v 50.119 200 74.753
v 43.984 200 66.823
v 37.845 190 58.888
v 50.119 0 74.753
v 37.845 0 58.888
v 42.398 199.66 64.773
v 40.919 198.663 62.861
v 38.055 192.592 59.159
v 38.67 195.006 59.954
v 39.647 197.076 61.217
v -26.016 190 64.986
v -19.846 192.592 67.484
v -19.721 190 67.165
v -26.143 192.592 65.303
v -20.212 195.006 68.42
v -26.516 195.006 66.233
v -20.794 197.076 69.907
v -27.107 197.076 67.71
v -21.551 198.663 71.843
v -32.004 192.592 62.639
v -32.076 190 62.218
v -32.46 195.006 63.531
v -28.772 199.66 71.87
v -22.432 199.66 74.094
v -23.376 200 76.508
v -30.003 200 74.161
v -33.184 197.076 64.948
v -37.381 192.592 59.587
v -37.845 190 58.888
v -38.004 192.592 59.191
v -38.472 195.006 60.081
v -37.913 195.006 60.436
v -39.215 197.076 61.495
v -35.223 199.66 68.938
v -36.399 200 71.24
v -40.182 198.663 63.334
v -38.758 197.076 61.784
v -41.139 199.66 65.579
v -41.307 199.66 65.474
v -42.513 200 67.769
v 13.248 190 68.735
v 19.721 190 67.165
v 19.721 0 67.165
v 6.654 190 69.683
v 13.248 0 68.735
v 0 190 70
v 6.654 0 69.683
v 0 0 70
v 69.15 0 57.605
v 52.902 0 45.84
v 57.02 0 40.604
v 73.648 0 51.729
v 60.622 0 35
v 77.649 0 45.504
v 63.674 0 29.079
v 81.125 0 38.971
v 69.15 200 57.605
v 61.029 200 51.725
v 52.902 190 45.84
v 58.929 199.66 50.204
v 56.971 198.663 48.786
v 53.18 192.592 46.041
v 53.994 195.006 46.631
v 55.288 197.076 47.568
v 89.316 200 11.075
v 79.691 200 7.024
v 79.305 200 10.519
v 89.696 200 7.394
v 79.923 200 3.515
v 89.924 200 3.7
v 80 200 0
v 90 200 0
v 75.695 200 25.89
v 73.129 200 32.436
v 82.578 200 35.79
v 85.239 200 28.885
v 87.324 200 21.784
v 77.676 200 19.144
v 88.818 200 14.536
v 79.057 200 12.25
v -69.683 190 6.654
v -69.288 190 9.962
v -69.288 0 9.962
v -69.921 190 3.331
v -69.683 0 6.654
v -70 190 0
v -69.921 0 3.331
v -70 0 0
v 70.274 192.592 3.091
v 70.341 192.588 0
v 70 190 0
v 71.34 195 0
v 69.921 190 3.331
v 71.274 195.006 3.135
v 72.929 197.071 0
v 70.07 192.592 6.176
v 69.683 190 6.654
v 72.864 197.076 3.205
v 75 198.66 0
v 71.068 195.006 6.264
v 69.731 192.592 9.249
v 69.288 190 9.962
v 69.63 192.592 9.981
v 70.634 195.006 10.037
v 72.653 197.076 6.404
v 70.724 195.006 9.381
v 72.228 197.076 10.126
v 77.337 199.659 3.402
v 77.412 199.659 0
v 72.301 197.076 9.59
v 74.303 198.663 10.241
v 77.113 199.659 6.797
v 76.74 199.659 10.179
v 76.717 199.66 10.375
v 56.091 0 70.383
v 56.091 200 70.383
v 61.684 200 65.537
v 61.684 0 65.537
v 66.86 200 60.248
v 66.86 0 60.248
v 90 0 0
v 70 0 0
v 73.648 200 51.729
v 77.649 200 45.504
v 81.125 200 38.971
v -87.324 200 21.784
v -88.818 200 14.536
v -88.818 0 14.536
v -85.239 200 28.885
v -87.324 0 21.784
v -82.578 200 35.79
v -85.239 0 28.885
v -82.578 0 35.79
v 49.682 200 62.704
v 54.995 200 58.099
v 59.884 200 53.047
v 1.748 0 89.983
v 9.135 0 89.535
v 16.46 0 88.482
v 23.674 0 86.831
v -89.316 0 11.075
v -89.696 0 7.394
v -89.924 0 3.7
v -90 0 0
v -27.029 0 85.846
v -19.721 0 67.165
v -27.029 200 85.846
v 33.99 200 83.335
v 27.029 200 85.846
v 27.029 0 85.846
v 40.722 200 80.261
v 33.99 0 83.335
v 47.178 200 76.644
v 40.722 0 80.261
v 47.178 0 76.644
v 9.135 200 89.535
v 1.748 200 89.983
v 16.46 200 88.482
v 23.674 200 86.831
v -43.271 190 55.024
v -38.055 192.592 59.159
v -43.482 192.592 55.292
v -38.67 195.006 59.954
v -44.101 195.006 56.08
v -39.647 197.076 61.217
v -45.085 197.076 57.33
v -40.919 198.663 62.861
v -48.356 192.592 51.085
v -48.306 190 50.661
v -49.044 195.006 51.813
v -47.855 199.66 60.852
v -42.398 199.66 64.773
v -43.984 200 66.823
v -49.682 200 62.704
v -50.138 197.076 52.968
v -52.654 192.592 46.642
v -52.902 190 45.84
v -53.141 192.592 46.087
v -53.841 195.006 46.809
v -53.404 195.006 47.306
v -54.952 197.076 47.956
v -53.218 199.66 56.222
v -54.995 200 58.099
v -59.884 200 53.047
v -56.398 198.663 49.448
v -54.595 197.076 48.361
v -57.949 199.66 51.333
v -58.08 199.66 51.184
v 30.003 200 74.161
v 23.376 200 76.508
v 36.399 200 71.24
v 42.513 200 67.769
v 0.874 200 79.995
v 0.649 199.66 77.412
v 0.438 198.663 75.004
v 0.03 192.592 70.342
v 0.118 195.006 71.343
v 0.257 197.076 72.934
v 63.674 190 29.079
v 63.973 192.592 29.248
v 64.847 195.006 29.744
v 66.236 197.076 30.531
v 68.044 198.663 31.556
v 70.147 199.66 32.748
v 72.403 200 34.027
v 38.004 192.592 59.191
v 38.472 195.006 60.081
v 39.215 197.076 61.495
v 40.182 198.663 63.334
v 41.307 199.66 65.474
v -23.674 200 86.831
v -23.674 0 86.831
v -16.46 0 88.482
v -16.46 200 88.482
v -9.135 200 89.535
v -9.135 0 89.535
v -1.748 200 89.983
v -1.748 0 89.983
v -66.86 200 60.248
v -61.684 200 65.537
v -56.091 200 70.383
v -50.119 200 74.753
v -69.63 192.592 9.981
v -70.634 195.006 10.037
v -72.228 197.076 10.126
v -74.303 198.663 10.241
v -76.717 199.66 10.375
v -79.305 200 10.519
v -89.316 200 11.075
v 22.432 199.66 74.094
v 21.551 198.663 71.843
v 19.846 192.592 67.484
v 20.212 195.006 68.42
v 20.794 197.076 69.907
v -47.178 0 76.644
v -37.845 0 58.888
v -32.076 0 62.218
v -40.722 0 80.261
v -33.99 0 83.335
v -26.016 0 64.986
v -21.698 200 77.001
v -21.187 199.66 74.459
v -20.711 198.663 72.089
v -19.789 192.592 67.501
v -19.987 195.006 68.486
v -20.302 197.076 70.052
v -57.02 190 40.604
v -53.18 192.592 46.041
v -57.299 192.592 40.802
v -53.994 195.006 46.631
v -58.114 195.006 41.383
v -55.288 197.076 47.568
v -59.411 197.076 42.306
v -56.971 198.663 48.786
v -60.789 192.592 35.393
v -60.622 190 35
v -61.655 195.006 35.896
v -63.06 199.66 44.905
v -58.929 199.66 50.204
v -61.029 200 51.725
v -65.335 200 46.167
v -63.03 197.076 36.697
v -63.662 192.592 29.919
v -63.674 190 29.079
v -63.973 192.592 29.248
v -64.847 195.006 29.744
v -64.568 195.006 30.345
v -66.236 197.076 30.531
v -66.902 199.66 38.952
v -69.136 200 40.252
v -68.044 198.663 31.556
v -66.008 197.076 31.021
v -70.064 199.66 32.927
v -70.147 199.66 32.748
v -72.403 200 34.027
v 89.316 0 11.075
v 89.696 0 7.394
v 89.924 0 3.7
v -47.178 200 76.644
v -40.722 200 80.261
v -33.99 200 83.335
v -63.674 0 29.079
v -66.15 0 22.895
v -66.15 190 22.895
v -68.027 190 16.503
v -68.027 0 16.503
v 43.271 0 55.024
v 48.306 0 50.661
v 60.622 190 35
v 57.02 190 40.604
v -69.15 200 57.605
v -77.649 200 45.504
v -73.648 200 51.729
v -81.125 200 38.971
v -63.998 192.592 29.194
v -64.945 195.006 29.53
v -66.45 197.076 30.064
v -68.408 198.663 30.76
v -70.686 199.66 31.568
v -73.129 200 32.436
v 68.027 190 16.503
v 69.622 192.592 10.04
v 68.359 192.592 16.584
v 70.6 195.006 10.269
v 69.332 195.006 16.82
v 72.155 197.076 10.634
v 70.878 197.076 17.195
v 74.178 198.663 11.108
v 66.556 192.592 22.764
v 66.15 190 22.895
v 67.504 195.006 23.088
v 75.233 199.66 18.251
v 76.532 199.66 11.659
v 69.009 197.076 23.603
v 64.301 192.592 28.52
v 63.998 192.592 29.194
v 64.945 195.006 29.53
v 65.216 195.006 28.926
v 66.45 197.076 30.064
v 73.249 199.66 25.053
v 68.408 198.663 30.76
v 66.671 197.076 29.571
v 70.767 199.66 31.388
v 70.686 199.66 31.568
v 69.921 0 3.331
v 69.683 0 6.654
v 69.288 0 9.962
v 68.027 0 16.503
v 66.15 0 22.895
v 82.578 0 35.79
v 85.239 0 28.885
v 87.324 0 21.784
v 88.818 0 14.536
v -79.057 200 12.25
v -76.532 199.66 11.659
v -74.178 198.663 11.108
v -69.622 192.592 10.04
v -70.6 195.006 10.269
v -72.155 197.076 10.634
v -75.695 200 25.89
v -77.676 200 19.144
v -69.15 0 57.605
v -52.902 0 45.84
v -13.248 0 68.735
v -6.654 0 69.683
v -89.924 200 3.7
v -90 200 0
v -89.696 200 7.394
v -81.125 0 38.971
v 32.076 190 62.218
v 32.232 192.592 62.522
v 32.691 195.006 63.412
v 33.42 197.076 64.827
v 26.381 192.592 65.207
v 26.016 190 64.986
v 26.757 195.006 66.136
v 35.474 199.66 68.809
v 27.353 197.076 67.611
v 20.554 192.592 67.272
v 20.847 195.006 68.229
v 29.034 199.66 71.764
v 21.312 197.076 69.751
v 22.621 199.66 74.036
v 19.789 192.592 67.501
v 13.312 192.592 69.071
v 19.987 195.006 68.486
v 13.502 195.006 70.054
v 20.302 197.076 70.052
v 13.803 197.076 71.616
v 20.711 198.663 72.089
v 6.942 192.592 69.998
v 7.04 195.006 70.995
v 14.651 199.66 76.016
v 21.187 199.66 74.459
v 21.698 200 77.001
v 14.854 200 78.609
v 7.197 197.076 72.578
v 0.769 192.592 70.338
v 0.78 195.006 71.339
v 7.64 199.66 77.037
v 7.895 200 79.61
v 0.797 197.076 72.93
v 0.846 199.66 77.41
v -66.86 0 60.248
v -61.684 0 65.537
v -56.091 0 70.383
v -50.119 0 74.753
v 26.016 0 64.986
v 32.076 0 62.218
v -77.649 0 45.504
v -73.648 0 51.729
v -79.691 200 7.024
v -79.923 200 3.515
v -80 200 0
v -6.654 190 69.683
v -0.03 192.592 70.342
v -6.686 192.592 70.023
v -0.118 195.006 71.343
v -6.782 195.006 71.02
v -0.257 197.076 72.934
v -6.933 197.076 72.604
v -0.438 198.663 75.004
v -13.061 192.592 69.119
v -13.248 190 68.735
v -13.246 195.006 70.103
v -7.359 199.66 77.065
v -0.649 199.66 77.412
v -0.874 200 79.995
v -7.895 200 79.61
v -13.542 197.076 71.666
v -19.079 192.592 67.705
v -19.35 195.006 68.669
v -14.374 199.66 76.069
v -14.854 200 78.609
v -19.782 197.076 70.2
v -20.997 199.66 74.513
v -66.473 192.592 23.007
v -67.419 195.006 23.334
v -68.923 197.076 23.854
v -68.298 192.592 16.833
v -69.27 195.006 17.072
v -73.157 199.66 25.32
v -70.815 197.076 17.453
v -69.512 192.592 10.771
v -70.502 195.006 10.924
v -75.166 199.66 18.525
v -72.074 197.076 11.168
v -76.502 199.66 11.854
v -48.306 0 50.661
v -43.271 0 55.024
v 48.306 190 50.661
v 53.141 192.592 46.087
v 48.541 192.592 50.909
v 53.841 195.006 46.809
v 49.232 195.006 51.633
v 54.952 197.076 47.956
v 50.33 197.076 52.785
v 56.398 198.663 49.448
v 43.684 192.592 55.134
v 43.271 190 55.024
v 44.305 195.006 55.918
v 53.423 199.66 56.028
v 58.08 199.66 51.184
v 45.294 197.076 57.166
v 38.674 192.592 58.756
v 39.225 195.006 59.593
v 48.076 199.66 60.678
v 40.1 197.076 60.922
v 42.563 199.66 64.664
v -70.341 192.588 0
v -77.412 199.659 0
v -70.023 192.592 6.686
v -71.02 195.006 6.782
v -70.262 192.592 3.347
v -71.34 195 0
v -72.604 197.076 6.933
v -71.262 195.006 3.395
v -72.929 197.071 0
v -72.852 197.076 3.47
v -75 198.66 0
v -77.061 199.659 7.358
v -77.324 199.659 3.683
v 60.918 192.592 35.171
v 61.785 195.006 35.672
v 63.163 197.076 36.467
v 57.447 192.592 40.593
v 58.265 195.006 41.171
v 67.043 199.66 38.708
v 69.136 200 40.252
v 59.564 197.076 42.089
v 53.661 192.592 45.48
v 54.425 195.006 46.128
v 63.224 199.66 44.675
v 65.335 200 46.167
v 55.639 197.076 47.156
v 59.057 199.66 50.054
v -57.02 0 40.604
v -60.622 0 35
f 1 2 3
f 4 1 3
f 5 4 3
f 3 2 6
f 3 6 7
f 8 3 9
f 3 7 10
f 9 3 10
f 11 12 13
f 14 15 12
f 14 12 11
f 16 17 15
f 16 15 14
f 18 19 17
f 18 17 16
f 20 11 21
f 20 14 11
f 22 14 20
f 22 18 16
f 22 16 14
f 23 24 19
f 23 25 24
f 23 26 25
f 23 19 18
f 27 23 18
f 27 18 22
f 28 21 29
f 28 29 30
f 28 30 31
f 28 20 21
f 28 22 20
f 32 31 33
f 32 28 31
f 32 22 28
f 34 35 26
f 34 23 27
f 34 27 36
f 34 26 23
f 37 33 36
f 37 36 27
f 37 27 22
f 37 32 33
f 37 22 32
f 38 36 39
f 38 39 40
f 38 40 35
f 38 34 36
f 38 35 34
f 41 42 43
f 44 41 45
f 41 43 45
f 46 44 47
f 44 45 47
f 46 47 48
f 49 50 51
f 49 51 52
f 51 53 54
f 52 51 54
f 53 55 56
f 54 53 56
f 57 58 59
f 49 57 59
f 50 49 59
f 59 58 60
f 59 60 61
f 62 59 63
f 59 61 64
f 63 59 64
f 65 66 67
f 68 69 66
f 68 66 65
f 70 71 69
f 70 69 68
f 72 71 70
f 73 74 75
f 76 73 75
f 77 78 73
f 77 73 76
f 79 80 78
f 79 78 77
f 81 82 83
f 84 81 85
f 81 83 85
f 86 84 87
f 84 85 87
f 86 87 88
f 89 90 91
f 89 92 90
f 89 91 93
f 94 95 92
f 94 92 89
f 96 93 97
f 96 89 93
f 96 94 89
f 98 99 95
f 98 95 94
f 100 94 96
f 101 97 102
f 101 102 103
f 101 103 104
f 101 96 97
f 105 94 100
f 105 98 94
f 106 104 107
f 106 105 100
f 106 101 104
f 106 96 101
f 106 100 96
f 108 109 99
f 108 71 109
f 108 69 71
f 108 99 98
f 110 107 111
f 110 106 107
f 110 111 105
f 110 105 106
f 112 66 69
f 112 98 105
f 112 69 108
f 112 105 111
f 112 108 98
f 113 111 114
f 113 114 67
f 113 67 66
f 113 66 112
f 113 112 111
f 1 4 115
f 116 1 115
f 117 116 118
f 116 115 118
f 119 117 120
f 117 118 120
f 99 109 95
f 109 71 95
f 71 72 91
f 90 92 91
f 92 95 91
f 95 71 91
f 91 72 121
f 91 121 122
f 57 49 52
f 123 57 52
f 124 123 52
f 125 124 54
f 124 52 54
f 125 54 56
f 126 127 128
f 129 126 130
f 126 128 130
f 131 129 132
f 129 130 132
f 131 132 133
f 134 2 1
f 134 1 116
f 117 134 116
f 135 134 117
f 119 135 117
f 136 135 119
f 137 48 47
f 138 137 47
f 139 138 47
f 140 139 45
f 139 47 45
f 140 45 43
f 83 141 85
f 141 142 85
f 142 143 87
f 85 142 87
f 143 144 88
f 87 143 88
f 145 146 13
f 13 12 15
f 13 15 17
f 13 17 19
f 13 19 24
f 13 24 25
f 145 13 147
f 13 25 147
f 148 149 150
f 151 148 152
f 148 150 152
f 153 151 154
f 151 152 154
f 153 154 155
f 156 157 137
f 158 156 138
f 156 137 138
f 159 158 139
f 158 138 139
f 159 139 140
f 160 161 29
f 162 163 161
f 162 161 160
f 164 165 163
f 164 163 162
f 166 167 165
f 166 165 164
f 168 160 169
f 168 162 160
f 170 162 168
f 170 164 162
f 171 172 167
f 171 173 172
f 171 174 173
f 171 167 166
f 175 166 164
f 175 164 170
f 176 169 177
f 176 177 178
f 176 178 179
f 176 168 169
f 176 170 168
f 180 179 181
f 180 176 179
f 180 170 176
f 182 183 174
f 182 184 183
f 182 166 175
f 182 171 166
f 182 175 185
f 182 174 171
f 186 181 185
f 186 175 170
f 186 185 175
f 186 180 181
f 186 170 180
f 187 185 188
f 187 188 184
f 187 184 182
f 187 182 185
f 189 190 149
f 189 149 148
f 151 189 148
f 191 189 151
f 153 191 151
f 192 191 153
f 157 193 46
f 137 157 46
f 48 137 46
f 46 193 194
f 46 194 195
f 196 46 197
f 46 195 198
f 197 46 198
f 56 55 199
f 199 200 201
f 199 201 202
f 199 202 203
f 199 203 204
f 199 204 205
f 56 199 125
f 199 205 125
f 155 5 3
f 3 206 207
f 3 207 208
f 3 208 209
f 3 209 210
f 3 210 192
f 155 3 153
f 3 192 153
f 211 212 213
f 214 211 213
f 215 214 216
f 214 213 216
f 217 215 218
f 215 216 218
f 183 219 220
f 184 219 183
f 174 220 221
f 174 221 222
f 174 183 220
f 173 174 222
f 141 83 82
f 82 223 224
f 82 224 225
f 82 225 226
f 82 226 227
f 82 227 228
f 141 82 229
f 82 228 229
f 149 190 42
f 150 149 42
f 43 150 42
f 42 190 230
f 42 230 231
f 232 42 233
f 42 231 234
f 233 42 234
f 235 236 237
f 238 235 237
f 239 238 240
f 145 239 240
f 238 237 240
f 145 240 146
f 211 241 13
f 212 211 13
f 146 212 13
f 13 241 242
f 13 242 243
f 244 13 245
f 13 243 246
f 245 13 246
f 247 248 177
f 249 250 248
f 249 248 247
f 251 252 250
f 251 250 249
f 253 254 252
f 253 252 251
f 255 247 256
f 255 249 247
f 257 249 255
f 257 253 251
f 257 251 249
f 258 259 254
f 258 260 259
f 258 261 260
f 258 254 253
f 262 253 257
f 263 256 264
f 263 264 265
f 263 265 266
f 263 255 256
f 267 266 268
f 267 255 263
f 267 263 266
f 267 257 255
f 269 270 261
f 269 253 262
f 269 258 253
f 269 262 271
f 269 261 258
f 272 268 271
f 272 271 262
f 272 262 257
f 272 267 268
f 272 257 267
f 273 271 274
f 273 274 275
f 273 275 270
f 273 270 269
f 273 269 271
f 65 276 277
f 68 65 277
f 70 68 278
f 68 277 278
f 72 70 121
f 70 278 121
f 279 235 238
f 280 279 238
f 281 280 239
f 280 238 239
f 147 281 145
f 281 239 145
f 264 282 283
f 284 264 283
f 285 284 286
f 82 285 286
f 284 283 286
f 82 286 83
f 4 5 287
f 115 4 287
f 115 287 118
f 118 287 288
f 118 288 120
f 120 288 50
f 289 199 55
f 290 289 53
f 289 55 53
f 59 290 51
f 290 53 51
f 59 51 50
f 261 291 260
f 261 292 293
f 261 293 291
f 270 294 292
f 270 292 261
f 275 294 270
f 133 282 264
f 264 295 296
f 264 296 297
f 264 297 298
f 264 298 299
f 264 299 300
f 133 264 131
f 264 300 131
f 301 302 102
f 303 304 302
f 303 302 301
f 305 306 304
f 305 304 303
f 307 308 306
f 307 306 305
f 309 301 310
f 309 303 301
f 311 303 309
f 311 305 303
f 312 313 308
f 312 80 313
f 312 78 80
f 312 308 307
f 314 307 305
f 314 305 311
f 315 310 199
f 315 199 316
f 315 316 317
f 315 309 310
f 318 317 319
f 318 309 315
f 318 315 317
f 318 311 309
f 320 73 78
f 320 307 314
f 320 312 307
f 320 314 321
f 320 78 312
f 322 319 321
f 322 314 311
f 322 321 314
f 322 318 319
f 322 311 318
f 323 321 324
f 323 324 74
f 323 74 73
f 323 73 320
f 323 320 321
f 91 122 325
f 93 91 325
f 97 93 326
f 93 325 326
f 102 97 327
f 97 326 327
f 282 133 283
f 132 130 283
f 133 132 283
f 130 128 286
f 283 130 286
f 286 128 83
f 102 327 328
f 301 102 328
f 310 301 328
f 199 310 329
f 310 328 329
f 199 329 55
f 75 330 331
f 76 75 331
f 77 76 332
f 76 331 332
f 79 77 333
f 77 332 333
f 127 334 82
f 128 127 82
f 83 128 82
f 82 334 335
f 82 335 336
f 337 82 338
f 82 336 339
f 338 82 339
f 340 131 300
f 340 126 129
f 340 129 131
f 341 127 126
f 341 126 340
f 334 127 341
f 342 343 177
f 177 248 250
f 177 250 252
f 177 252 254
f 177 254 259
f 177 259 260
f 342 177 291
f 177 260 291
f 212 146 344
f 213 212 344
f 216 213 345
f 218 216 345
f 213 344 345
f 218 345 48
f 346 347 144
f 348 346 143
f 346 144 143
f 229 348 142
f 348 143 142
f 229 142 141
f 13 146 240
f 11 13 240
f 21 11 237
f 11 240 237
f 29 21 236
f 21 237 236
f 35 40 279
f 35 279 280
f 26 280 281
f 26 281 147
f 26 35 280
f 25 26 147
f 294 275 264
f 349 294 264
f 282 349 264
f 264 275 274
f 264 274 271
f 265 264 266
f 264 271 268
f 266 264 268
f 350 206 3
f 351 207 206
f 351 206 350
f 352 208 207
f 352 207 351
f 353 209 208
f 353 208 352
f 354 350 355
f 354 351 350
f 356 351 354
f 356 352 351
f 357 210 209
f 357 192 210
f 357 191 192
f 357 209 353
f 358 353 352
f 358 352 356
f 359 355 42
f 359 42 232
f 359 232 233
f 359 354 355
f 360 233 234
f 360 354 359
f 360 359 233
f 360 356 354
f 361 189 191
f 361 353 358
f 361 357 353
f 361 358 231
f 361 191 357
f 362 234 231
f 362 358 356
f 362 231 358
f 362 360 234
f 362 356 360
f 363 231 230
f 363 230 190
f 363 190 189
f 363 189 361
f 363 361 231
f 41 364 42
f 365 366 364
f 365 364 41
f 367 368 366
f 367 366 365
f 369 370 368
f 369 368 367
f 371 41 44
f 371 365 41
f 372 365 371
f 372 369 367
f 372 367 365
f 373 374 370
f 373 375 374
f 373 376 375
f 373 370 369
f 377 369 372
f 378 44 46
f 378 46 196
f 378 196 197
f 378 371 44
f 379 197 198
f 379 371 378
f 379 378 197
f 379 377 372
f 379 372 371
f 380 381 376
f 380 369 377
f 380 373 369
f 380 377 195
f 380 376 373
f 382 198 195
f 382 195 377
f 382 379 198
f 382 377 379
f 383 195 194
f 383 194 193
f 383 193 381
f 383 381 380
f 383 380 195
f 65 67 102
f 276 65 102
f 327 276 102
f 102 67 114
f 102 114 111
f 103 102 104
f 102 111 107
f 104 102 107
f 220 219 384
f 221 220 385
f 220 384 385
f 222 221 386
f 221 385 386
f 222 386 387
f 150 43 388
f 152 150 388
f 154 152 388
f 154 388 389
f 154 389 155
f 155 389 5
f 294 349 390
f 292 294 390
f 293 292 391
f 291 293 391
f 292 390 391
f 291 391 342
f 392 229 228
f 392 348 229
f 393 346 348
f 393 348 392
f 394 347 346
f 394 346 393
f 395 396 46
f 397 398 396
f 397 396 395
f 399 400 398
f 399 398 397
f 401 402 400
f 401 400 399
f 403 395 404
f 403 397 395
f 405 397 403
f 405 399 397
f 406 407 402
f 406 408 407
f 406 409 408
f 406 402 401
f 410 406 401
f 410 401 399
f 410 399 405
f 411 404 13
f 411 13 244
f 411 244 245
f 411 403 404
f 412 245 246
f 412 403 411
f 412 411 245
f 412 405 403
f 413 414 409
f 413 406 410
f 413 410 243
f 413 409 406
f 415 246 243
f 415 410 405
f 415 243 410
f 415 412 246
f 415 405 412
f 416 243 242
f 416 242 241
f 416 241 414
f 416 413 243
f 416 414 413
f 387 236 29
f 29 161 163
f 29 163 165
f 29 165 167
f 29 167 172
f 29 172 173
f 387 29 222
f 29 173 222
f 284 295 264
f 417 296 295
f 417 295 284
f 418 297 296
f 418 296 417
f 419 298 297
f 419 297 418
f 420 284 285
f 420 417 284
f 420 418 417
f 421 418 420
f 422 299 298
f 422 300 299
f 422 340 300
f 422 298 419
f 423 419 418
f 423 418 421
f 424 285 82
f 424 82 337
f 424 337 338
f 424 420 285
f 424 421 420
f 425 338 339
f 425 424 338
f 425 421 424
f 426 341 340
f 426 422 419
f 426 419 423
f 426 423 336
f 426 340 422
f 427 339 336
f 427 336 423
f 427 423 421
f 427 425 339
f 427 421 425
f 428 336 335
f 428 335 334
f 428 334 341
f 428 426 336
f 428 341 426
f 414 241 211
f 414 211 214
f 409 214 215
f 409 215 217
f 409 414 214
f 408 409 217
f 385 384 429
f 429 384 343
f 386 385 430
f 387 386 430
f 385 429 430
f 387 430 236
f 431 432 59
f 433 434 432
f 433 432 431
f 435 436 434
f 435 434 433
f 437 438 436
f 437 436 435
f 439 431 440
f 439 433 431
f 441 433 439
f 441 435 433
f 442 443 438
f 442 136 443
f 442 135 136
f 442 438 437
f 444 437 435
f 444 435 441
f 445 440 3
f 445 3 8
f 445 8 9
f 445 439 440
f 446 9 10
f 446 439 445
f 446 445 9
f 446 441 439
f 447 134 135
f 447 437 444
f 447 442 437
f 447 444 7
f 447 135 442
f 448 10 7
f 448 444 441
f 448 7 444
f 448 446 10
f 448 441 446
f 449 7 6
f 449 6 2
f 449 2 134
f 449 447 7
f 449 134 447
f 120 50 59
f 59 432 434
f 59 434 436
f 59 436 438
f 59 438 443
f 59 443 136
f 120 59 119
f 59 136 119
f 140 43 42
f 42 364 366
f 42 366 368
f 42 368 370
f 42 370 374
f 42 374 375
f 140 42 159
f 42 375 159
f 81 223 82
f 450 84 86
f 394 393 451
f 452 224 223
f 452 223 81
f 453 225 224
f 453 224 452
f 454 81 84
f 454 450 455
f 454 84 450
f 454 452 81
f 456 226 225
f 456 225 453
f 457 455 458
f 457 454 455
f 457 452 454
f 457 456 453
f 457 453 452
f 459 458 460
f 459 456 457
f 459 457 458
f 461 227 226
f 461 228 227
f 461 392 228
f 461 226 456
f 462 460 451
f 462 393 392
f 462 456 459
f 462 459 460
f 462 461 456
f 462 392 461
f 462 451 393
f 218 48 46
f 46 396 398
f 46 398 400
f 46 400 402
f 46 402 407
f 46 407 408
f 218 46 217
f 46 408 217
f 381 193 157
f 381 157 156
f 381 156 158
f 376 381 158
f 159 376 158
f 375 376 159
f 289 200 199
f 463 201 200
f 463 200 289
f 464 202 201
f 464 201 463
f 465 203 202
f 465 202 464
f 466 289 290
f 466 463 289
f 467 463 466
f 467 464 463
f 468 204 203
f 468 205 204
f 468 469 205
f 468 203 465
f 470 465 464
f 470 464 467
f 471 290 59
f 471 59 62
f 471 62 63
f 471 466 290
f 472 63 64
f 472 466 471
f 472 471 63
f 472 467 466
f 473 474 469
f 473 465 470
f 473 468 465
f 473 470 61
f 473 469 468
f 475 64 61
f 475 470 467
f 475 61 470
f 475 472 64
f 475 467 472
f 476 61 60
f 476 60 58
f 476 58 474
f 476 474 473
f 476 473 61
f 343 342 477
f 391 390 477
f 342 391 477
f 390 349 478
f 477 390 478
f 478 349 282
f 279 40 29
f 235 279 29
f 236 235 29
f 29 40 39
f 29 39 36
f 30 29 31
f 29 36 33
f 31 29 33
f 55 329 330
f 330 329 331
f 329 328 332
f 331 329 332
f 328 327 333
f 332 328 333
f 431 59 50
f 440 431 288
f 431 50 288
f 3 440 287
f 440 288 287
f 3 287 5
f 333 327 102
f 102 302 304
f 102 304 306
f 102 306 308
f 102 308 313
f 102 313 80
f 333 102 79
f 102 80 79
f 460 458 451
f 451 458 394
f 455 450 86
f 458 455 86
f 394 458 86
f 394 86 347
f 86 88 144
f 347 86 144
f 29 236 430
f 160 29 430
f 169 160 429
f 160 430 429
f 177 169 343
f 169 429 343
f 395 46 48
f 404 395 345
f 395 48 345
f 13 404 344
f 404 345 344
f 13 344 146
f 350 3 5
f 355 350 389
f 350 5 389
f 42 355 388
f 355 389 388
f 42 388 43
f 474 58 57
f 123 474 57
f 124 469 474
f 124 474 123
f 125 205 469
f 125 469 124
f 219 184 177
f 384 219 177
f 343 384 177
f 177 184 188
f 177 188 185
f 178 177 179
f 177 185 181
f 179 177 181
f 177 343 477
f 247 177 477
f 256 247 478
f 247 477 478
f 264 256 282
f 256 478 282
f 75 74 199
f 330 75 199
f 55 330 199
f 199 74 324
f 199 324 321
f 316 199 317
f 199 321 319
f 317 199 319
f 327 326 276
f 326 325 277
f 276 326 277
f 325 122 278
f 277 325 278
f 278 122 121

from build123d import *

# Parameters (mm, degrees)
BOSS_EXTRUDE1_DEPTH = 200
FILLET1_R           = 10
CUT_EXTRUDE1_START  = -200.000005
CUT_EXTRUDE1_DEPTH  = 200.000005


with BuildPart() as part:
    # Sketch1 → Boss-Extrude1 (new body)
    with BuildSketch(Plane(origin=(0, 0, 0), x_dir=(1, 0, 0), z_dir=(0, 1, 0))):
        with BuildLine():
            Line((90, 0), (70, 0))
            ThreePointArc((70, 0), (0, -70), (-70, 0))
            Line((-70, 0), (-90, 0))
            ThreePointArc((-90, 0), (0, -90), (90, 0))
        make_face()
    extrude(amount=BOSS_EXTRUDE1_DEPTH)

    # Fillet1
    fillet1_edges = [part.edges().sort_by_distance(p)[0] for p in [
        (0, 200, 70),
    ]]
    fillet(fillet1_edges, radius=FILLET1_R)

    # Sketch2 → Cut-Extrude1 (cut)
    with BuildSketch(Plane.XZ.offset(CUT_EXTRUDE1_START)):
        with BuildLine():
            Line((0, 70), (-1.74828752, 89.983017791))
            ThreePointArc((-1.74828752, 89.983017791), (0, 90), (1.74828752, 89.983017791))
            Line((1.74828752, 89.983017791), (0, 70))
        make_face()
        with BuildLine():
            Line((19.721278979, 67.164508153), (23.673676083, 86.830622828))
            ThreePointArc((23.673676083, 86.830622828), (25.355930116, 86.354367625), (27.028615266, 85.845523802))
            Line((27.028615266, 85.845523802), (19.721278979, 67.164508153))
        make_face()
        with BuildLine():
            Line((37.844857222, 58.887747298), (47.177739243, 76.643727205))
            ThreePointArc((47.177739243, 76.643727205), (48.657673571, 75.712817955), (50.119245348, 74.753336018))
            Line((50.119245348, 74.753336018), (37.844857222, 58.887747298))
        make_face()
        with BuildLine():
            Line((52.902470205, 45.840251376), (66.859742546, 60.247612622))
            ThreePointArc((66.859742546, 60.247612622), (68.017461692, 58.937466055), (69.149512243, 57.605077524))
            Line((69.149512243, 57.605077524), (52.902470205, 45.840251376))
        make_face()
        with BuildLine():
            Line((63.674239675, 29.07905091), (81.125167138, 38.970594771))
            ThreePointArc((81.125167138, 38.970594771), (81.866879582, 37.38735117), (82.577696904, 35.789998241))
            Line((82.577696904, 35.789998241), (63.674239675, 29.07905091))
        make_face()
        with BuildLine():
            Line((69.287500932, 9.962038679), (88.818313159, 14.536411098))
            ThreePointArc((88.818313159, 14.536411098), (89.083929769, 12.808335445), (89.31592767, 11.075426151))
            Line((89.31592767, 11.075426151), (69.287500932, 9.962038679))
        make_face()
        with BuildLine():
            Line((69.287500932, -9.962038679), (89.31592767, -11.075426151))
            ThreePointArc((89.31592767, -11.075426151), (89.083929769, -12.808335445), (88.818313159, -14.536411098))
            Line((88.818313159, -14.536411098), (69.287500932, -9.962038679))
        make_face()
        with BuildLine():
            Line((63.674239675, -29.07905091), (82.577696904, -35.789998241))
            ThreePointArc((82.577696904, -35.789998241), (81.866879582, -37.38735117), (81.125167138, -38.970594771))
            Line((81.125167138, -38.970594771), (63.674239675, -29.07905091))
        make_face()
        with BuildLine():
            Line((52.902470205, -45.840251376), (69.149512243, -57.605077524))
            ThreePointArc((69.149512243, -57.605077524), (68.017461692, -58.937466055), (66.859742546, -60.247612622))
            Line((66.859742546, -60.247612622), (52.902470205, -45.840251376))
        make_face()
        with BuildLine():
            Line((37.844857222, -58.887747298), (50.119245348, -74.753336018))
            ThreePointArc((50.119245348, -74.753336018), (48.657673571, -75.712817955), (47.177739243, -76.643727205))
            Line((47.177739243, -76.643727205), (37.844857222, -58.887747298))
        make_face()
        with BuildLine():
            Line((19.721278979, -67.164508153), (27.028615266, -85.845523802))
            ThreePointArc((27.028615266, -85.845523802), (25.355930116, -86.354367625), (23.673676083, -86.830622828))
            Line((23.673676083, -86.830622828), (19.721278979, -67.164508153))
        make_face()
        with BuildLine():
            Line((0, -70), (1.74828752, -89.983017791))
            ThreePointArc((1.74828752, -89.983017791), (0, -90), (-1.74828752, -89.983017791))
            Line((-1.74828752, -89.983017791), (0, -70))
        make_face()
        with BuildLine():
            Line((-19.721278979, -67.164508153), (-23.673676083, -86.830622828))
            ThreePointArc((-23.673676083, -86.830622828), (-25.355930116, -86.354367625), (-27.028615266, -85.845523802))
            Line((-27.028615266, -85.845523802), (-19.721278979, -67.164508153))
        make_face()
        with BuildLine():
            Line((-37.844857222, -58.887747298), (-47.177739243, -76.643727205))
            ThreePointArc((-47.177739243, -76.643727205), (-48.657673571, -75.712817955), (-50.119245348, -74.753336018))
            Line((-50.119245348, -74.753336018), (-37.844857222, -58.887747298))
        make_face()
        with BuildLine():
            Line((-52.902470205, -45.840251376), (-66.859742546, -60.247612622))
            ThreePointArc((-66.859742546, -60.247612622), (-68.017461692, -58.937466055), (-69.149512243, -57.605077524))
            Line((-69.149512243, -57.605077524), (-52.902470205, -45.840251376))
        make_face()
        with BuildLine():
            Line((-63.674239675, -29.07905091), (-81.125167138, -38.970594771))
            ThreePointArc((-81.125167138, -38.970594771), (-81.866879582, -37.38735117), (-82.577696904, -35.789998241))
            Line((-82.577696904, -35.789998241), (-63.674239675, -29.07905091))
        make_face()
        with BuildLine():
            Line((-69.287500932, -9.962038679), (-88.818313159, -14.536411098))
            ThreePointArc((-88.818313159, -14.536411098), (-89.083929769, -12.808335445), (-89.31592767, -11.075426151))
            Line((-89.31592767, -11.075426151), (-69.287500932, -9.962038679))
        make_face()
        with BuildLine():
            Line((-69.287500932, 9.962038679), (-89.31592767, 11.075426151))
            ThreePointArc((-89.31592767, 11.075426151), (-89.083929769, 12.808335445), (-88.818313159, 14.536411098))
            Line((-88.818313159, 14.536411098), (-69.287500932, 9.962038679))
        make_face()
        with BuildLine():
            Line((-63.674239675, 29.07905091), (-82.577696904, 35.789998241))
            ThreePointArc((-82.577696904, 35.789998241), (-81.866879582, 37.38735117), (-81.125167138, 38.970594771))
            Line((-81.125167138, 38.970594771), (-63.674239675, 29.07905091))
        make_face()
        with BuildLine():
            Line((-52.902470205, 45.840251376), (-69.149512243, 57.605077524))
            ThreePointArc((-69.149512243, 57.605077524), (-68.017461692, 58.937466055), (-66.859742546, 60.247612622))
            Line((-66.859742546, 60.247612622), (-52.902470205, 45.840251376))
        make_face()
        with BuildLine():
            Line((-37.844857222, 58.887747298), (-50.119245348, 74.753336018))
            ThreePointArc((-50.119245348, 74.753336018), (-48.657673571, 75.712817955), (-47.177739243, 76.643727205))
            Line((-47.177739243, 76.643727205), (-37.844857222, 58.887747298))
        make_face()
        with BuildLine():
            Line((-19.721278979, 67.164508153), (-27.028615266, 85.845523802))
            ThreePointArc((-27.028615266, 85.845523802), (-25.355930116, 86.354367625), (-23.673676083, 86.830622828))
            Line((-23.673676083, 86.830622828), (-19.721278979, 67.164508153))
        make_face()
    extrude(amount=CUT_EXTRUDE1_DEPTH, mode=Mode.SUBTRACT)


with BuildPart() as cut_extrude1_piece_1:
    # of the separate pieces the step leaves, piece 1, a body of its own (cut_extrude1_pieces)
    add(part.part.solids().sort_by_distance((-43.984331112, 200, 66.82348851))[0])


with BuildPart() as cut_extrude1_piece_2:
    # of the separate pieces the step leaves, piece 2, a body of its own (cut_extrude1_pieces)
    add(part.part.solids().sort_by_distance((-73.129479391, 200, 32.435771057))[0])


with BuildPart() as cut_extrude1_piece_3:
    # of the separate pieces the step leaves, piece 3, a body of its own (cut_extrude1_pieces)
    add(part.part.solids().sort_by_distance((42.513031709, 200, 67.769035222))[0])


with BuildPart() as cut_extrude1_piece_4:
    # of the separate pieces the step leaves, piece 4, a body of its own (cut_extrude1_pieces)
    add(part.part.solids().sort_by_distance((-23.376304376, 200, 76.508485763))[0])


with BuildPart() as cut_extrude1_piece_5:
    # of the separate pieces the step leaves, piece 5, a body of its own (cut_extrude1_pieces)
    add(part.part.solids().sort_by_distance((21.698211644, 200, 77.001218247))[0])


with BuildPart() as cut_extrude1_piece_6:
    # of the separate pieces the step leaves, piece 6, a body of its own (cut_extrude1_pieces)
    add(part.part.solids().sort_by_distance((-61.029008926, 200, 51.724849632))[0])


with BuildPart() as cut_extrude1_piece_7:
    # of the separate pieces the step leaves, piece 7, a body of its own (cut_extrude1_pieces)
    add(part.part.solids().sort_by_distance((72.402944717, 200, 34.026660082))[0])


with BuildPart() as cut_extrude1_piece_8:
    # of the separate pieces the step leaves, piece 8, a body of its own (cut_extrude1_pieces)
    add(part.part.solids().sort_by_distance((79.056534671, 200, 12.250074526))[0])


with BuildPart() as cut_extrude1_piece_9:
    # of the separate pieces the step leaves, piece 9, a body of its own (cut_extrude1_pieces)
    add(part.part.solids().sort_by_distance((59.883698779, 200, 53.046608002))[0])


with BuildPart() as cut_extrude1_piece_10:
    # of the separate pieces the step leaves, piece 10, a body of its own (cut_extrude1_pieces)
    add(part.part.solids().sort_by_distance((-0.874468484, 200, 79.995220513))[0])


with BuildPart() as cut_extrude1_piece_11:
    # of the separate pieces the step leaves, piece 11, a body of its own (cut_extrude1_pieces)
    add(part.part.solids().sort_by_distance((70, 190, 0))[0])


with BuildPart() as cut_extrude1_piece_12:
    # of the separate pieces the step leaves, piece 12, a body of its own (cut_extrude1_pieces)
    add(part.part.solids().sort_by_distance((-70, 0, 0))[0])


solid = Compound([cut_extrude1_piece_1.part, cut_extrude1_piece_2.part, cut_extrude1_piece_3.part, cut_extrude1_piece_4.part, cut_extrude1_piece_5.part, cut_extrude1_piece_6.part, cut_extrude1_piece_7.part, cut_extrude1_piece_8.part, cut_extrude1_piece_9.part, cut_extrude1_piece_10.part, cut_extrude1_piece_11.part, cut_extrude1_piece_12.part])
